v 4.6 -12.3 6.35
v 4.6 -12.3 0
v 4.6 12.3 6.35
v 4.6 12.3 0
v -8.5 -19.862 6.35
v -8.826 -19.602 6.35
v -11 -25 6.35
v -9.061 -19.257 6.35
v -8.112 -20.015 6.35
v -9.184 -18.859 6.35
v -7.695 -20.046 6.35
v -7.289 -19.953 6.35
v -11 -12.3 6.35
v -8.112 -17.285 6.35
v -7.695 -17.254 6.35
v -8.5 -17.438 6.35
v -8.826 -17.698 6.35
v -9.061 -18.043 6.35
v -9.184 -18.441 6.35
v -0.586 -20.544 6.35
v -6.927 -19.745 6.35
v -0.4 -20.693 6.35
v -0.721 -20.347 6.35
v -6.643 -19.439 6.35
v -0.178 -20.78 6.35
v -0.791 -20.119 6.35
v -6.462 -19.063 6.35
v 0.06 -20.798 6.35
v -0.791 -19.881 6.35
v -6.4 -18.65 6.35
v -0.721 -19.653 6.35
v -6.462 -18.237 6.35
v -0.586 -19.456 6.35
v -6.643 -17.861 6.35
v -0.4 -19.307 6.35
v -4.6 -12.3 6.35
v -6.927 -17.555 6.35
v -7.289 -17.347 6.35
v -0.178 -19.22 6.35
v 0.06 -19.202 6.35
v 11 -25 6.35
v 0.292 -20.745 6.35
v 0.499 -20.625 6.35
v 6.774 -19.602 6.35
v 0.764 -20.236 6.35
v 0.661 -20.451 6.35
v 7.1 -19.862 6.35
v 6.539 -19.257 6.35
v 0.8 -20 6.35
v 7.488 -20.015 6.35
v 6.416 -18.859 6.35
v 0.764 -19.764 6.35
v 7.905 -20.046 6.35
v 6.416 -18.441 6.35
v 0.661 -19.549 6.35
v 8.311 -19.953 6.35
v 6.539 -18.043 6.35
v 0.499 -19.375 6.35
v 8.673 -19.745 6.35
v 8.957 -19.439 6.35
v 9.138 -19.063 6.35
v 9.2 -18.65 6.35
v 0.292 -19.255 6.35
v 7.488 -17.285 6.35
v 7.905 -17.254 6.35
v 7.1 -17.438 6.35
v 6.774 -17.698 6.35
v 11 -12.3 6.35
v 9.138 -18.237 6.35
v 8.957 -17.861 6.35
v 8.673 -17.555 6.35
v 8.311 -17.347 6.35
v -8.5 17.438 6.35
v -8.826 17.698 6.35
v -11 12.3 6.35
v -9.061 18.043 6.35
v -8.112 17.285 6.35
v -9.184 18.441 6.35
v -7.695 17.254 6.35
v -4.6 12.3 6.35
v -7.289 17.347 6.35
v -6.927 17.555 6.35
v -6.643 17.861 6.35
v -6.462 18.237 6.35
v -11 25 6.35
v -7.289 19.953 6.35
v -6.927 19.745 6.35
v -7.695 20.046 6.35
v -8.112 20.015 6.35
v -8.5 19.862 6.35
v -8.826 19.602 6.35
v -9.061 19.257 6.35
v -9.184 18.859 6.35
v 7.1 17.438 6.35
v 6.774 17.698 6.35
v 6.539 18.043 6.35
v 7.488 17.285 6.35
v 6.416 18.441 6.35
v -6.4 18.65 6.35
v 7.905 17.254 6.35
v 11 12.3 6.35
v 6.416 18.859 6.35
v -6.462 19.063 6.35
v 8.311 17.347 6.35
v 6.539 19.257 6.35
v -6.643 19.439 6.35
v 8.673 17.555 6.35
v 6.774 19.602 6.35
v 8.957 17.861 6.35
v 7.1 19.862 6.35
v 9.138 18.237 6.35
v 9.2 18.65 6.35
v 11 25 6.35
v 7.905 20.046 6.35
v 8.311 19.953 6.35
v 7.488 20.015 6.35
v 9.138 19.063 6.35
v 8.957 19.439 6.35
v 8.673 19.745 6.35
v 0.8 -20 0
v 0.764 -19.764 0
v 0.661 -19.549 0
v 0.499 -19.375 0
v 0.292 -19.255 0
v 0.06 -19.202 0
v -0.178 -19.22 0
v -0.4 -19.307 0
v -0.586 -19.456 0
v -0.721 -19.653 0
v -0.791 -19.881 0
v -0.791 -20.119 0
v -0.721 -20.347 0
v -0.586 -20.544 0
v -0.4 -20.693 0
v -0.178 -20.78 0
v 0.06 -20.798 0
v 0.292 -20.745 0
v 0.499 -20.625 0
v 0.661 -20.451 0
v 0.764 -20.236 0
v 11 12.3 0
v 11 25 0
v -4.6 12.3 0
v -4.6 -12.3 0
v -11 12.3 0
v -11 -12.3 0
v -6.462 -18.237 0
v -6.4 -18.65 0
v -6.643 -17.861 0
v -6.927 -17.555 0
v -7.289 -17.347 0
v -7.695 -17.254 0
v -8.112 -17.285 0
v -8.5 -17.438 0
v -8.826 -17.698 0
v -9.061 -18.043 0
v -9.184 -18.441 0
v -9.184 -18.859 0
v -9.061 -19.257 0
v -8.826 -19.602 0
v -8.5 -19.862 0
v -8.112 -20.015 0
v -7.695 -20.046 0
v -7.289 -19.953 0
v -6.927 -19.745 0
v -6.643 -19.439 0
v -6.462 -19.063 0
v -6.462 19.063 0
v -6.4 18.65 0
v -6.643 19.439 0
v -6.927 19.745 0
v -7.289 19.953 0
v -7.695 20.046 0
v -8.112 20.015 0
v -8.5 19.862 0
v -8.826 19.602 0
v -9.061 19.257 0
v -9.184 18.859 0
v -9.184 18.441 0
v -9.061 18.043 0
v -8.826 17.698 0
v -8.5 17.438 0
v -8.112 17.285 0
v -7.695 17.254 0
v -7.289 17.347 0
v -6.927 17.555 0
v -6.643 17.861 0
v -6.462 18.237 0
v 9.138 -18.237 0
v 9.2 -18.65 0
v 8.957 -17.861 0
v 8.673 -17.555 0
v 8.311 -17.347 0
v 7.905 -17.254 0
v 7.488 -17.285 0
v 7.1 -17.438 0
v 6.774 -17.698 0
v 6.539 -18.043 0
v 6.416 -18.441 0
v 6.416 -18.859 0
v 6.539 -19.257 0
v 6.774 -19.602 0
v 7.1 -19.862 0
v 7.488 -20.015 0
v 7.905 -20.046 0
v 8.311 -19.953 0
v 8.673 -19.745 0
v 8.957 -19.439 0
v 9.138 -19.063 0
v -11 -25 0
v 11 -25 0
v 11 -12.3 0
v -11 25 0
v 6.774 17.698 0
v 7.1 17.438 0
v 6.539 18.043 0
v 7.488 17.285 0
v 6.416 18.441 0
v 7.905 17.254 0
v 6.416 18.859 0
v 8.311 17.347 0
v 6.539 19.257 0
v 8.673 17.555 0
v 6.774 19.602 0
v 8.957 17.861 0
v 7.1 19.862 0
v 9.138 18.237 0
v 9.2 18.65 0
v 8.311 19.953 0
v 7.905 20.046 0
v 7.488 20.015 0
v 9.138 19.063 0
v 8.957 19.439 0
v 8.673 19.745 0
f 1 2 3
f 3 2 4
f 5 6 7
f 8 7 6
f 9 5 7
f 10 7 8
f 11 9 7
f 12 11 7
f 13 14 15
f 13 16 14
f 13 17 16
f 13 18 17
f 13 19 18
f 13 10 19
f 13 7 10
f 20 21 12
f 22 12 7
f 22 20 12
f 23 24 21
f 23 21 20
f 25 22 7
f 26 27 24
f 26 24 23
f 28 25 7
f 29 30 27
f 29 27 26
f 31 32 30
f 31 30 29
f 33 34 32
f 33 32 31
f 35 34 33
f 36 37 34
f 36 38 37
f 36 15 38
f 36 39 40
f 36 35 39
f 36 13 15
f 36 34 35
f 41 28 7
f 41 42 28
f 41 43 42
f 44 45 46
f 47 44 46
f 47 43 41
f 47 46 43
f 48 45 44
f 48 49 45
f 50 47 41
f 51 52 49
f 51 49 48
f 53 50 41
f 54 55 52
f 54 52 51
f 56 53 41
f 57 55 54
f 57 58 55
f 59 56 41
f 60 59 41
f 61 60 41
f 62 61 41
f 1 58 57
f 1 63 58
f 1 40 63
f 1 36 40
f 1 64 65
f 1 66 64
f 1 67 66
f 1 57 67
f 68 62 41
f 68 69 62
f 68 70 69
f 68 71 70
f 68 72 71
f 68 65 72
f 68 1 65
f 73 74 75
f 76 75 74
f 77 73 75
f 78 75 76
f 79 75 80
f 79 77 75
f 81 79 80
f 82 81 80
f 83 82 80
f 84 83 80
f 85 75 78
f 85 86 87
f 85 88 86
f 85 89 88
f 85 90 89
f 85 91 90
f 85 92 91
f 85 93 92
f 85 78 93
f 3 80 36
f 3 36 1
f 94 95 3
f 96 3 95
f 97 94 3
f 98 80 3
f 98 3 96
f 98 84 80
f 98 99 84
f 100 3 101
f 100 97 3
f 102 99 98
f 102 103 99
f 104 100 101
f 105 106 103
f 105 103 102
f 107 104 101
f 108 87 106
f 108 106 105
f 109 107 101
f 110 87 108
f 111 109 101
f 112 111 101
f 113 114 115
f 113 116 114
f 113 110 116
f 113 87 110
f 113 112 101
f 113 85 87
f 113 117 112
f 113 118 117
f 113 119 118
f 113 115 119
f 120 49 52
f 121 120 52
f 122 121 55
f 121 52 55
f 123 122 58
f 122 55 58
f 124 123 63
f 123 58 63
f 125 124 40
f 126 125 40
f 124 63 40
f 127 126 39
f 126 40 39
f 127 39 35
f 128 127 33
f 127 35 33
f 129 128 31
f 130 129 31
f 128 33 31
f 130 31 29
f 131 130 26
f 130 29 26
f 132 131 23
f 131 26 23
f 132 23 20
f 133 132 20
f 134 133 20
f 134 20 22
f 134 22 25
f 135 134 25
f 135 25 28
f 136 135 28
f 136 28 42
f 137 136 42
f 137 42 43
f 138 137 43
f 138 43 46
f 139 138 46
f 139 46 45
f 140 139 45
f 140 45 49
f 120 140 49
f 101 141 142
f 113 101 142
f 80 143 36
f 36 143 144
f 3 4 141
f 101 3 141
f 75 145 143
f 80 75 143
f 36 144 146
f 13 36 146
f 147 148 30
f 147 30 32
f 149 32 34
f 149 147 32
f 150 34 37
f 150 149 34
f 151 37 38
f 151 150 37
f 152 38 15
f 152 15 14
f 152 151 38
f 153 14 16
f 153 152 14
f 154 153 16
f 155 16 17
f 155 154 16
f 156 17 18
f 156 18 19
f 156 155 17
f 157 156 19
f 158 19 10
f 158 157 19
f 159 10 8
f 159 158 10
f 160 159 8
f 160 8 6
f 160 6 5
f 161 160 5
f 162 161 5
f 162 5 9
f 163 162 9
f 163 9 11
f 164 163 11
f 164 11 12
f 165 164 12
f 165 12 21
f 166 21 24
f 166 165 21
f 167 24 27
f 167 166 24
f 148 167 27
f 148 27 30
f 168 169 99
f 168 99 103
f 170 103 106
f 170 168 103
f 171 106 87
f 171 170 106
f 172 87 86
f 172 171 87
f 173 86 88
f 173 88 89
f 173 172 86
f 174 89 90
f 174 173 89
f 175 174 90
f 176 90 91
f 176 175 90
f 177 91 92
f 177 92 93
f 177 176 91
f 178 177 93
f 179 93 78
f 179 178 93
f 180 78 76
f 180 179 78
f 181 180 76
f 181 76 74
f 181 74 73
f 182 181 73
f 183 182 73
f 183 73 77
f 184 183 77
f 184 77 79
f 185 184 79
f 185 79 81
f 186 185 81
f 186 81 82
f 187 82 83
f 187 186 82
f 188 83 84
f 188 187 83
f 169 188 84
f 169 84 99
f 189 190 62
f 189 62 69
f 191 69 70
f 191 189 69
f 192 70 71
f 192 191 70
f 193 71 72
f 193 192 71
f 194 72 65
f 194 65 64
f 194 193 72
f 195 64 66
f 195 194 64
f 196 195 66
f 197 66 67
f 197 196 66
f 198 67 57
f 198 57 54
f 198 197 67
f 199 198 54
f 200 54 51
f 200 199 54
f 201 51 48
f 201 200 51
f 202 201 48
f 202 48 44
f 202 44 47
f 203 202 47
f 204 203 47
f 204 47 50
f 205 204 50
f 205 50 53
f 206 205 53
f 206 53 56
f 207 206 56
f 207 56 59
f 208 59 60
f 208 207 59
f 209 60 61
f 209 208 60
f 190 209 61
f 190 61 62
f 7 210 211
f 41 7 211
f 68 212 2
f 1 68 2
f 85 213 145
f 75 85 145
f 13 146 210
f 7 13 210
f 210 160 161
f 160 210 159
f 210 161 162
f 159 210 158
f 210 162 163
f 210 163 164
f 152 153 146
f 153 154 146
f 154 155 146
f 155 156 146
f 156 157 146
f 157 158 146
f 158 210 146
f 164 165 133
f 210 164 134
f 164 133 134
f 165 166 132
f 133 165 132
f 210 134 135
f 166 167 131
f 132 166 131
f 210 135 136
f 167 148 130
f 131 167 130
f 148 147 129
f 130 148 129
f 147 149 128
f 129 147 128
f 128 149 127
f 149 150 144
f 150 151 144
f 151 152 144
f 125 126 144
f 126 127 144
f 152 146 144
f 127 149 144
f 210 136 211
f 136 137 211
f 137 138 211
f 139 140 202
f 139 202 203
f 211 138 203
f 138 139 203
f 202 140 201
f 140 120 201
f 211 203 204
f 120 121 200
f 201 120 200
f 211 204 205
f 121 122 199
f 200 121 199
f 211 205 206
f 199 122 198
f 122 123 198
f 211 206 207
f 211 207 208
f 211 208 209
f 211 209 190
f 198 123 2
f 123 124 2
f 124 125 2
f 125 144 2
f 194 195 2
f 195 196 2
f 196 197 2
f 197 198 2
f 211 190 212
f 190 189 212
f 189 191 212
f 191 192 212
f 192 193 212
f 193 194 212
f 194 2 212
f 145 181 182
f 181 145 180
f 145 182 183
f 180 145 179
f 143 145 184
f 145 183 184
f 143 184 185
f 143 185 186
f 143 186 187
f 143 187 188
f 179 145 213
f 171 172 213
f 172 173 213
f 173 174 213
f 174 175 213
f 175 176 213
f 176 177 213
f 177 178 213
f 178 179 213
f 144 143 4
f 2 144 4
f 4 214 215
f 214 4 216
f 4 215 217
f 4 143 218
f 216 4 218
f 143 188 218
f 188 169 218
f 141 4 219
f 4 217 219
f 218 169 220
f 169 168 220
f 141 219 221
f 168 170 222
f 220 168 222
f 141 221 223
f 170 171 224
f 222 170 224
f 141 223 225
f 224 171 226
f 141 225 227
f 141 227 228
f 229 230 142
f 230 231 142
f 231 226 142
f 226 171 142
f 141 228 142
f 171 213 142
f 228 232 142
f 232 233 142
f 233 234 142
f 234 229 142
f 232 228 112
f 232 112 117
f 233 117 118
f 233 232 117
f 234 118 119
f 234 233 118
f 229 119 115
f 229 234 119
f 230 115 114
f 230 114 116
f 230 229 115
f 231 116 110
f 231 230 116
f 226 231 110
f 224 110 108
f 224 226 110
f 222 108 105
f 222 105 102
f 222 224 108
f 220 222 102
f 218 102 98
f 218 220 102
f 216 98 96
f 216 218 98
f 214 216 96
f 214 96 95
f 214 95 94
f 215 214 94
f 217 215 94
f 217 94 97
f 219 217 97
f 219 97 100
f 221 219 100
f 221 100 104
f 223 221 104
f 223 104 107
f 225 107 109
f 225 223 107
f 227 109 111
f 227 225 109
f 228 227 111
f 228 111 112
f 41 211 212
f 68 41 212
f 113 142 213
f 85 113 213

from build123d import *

# Parameters (mm, degrees)
SKETCH1_R           = 1.4
BOSS_EXTRUDE1_DEPTH = 6.35
SKETCH2_R           = 0.8
CUT_EXTRUDE1_DEPTH  = 29.041442545


with BuildPart() as part:
    # Sketch1 → Boss-Extrude1 (new body)
    with BuildSketch(Plane.XY):
        Polygon((11, -25), (11, -12.3), (4.6, -12.3), (4.6, 12.3), (11, 12.3), (11, 25), (-11, 25), (-11, 12.3), (-4.6, 12.3), (-4.6, -12.3), (-11, -12.3), (-11, -25), align=None)
        with Locations((7.8, -18.65)):
            Circle(SKETCH1_R, mode=Mode.SUBTRACT)
        with Locations((-7.8, -18.65)):
            Circle(SKETCH1_R, mode=Mode.SUBTRACT)
        with Locations((7.8, 18.65)):
            Circle(SKETCH1_R, mode=Mode.SUBTRACT)
        with Locations((-7.8, 18.65)):
            Circle(SKETCH1_R, mode=Mode.SUBTRACT)
    extrude(amount=BOSS_EXTRUDE1_DEPTH)

    # Sketch2 → Cut-Extrude1 (cut, through all)
    with BuildSketch(Plane.XY.offset(6.35)):
        with Locations((0, -20)):
            Circle(SKETCH2_R)
    extrude(amount=-CUT_EXTRUDE1_DEPTH, mode=Mode.SUBTRACT)


solid = part.part
